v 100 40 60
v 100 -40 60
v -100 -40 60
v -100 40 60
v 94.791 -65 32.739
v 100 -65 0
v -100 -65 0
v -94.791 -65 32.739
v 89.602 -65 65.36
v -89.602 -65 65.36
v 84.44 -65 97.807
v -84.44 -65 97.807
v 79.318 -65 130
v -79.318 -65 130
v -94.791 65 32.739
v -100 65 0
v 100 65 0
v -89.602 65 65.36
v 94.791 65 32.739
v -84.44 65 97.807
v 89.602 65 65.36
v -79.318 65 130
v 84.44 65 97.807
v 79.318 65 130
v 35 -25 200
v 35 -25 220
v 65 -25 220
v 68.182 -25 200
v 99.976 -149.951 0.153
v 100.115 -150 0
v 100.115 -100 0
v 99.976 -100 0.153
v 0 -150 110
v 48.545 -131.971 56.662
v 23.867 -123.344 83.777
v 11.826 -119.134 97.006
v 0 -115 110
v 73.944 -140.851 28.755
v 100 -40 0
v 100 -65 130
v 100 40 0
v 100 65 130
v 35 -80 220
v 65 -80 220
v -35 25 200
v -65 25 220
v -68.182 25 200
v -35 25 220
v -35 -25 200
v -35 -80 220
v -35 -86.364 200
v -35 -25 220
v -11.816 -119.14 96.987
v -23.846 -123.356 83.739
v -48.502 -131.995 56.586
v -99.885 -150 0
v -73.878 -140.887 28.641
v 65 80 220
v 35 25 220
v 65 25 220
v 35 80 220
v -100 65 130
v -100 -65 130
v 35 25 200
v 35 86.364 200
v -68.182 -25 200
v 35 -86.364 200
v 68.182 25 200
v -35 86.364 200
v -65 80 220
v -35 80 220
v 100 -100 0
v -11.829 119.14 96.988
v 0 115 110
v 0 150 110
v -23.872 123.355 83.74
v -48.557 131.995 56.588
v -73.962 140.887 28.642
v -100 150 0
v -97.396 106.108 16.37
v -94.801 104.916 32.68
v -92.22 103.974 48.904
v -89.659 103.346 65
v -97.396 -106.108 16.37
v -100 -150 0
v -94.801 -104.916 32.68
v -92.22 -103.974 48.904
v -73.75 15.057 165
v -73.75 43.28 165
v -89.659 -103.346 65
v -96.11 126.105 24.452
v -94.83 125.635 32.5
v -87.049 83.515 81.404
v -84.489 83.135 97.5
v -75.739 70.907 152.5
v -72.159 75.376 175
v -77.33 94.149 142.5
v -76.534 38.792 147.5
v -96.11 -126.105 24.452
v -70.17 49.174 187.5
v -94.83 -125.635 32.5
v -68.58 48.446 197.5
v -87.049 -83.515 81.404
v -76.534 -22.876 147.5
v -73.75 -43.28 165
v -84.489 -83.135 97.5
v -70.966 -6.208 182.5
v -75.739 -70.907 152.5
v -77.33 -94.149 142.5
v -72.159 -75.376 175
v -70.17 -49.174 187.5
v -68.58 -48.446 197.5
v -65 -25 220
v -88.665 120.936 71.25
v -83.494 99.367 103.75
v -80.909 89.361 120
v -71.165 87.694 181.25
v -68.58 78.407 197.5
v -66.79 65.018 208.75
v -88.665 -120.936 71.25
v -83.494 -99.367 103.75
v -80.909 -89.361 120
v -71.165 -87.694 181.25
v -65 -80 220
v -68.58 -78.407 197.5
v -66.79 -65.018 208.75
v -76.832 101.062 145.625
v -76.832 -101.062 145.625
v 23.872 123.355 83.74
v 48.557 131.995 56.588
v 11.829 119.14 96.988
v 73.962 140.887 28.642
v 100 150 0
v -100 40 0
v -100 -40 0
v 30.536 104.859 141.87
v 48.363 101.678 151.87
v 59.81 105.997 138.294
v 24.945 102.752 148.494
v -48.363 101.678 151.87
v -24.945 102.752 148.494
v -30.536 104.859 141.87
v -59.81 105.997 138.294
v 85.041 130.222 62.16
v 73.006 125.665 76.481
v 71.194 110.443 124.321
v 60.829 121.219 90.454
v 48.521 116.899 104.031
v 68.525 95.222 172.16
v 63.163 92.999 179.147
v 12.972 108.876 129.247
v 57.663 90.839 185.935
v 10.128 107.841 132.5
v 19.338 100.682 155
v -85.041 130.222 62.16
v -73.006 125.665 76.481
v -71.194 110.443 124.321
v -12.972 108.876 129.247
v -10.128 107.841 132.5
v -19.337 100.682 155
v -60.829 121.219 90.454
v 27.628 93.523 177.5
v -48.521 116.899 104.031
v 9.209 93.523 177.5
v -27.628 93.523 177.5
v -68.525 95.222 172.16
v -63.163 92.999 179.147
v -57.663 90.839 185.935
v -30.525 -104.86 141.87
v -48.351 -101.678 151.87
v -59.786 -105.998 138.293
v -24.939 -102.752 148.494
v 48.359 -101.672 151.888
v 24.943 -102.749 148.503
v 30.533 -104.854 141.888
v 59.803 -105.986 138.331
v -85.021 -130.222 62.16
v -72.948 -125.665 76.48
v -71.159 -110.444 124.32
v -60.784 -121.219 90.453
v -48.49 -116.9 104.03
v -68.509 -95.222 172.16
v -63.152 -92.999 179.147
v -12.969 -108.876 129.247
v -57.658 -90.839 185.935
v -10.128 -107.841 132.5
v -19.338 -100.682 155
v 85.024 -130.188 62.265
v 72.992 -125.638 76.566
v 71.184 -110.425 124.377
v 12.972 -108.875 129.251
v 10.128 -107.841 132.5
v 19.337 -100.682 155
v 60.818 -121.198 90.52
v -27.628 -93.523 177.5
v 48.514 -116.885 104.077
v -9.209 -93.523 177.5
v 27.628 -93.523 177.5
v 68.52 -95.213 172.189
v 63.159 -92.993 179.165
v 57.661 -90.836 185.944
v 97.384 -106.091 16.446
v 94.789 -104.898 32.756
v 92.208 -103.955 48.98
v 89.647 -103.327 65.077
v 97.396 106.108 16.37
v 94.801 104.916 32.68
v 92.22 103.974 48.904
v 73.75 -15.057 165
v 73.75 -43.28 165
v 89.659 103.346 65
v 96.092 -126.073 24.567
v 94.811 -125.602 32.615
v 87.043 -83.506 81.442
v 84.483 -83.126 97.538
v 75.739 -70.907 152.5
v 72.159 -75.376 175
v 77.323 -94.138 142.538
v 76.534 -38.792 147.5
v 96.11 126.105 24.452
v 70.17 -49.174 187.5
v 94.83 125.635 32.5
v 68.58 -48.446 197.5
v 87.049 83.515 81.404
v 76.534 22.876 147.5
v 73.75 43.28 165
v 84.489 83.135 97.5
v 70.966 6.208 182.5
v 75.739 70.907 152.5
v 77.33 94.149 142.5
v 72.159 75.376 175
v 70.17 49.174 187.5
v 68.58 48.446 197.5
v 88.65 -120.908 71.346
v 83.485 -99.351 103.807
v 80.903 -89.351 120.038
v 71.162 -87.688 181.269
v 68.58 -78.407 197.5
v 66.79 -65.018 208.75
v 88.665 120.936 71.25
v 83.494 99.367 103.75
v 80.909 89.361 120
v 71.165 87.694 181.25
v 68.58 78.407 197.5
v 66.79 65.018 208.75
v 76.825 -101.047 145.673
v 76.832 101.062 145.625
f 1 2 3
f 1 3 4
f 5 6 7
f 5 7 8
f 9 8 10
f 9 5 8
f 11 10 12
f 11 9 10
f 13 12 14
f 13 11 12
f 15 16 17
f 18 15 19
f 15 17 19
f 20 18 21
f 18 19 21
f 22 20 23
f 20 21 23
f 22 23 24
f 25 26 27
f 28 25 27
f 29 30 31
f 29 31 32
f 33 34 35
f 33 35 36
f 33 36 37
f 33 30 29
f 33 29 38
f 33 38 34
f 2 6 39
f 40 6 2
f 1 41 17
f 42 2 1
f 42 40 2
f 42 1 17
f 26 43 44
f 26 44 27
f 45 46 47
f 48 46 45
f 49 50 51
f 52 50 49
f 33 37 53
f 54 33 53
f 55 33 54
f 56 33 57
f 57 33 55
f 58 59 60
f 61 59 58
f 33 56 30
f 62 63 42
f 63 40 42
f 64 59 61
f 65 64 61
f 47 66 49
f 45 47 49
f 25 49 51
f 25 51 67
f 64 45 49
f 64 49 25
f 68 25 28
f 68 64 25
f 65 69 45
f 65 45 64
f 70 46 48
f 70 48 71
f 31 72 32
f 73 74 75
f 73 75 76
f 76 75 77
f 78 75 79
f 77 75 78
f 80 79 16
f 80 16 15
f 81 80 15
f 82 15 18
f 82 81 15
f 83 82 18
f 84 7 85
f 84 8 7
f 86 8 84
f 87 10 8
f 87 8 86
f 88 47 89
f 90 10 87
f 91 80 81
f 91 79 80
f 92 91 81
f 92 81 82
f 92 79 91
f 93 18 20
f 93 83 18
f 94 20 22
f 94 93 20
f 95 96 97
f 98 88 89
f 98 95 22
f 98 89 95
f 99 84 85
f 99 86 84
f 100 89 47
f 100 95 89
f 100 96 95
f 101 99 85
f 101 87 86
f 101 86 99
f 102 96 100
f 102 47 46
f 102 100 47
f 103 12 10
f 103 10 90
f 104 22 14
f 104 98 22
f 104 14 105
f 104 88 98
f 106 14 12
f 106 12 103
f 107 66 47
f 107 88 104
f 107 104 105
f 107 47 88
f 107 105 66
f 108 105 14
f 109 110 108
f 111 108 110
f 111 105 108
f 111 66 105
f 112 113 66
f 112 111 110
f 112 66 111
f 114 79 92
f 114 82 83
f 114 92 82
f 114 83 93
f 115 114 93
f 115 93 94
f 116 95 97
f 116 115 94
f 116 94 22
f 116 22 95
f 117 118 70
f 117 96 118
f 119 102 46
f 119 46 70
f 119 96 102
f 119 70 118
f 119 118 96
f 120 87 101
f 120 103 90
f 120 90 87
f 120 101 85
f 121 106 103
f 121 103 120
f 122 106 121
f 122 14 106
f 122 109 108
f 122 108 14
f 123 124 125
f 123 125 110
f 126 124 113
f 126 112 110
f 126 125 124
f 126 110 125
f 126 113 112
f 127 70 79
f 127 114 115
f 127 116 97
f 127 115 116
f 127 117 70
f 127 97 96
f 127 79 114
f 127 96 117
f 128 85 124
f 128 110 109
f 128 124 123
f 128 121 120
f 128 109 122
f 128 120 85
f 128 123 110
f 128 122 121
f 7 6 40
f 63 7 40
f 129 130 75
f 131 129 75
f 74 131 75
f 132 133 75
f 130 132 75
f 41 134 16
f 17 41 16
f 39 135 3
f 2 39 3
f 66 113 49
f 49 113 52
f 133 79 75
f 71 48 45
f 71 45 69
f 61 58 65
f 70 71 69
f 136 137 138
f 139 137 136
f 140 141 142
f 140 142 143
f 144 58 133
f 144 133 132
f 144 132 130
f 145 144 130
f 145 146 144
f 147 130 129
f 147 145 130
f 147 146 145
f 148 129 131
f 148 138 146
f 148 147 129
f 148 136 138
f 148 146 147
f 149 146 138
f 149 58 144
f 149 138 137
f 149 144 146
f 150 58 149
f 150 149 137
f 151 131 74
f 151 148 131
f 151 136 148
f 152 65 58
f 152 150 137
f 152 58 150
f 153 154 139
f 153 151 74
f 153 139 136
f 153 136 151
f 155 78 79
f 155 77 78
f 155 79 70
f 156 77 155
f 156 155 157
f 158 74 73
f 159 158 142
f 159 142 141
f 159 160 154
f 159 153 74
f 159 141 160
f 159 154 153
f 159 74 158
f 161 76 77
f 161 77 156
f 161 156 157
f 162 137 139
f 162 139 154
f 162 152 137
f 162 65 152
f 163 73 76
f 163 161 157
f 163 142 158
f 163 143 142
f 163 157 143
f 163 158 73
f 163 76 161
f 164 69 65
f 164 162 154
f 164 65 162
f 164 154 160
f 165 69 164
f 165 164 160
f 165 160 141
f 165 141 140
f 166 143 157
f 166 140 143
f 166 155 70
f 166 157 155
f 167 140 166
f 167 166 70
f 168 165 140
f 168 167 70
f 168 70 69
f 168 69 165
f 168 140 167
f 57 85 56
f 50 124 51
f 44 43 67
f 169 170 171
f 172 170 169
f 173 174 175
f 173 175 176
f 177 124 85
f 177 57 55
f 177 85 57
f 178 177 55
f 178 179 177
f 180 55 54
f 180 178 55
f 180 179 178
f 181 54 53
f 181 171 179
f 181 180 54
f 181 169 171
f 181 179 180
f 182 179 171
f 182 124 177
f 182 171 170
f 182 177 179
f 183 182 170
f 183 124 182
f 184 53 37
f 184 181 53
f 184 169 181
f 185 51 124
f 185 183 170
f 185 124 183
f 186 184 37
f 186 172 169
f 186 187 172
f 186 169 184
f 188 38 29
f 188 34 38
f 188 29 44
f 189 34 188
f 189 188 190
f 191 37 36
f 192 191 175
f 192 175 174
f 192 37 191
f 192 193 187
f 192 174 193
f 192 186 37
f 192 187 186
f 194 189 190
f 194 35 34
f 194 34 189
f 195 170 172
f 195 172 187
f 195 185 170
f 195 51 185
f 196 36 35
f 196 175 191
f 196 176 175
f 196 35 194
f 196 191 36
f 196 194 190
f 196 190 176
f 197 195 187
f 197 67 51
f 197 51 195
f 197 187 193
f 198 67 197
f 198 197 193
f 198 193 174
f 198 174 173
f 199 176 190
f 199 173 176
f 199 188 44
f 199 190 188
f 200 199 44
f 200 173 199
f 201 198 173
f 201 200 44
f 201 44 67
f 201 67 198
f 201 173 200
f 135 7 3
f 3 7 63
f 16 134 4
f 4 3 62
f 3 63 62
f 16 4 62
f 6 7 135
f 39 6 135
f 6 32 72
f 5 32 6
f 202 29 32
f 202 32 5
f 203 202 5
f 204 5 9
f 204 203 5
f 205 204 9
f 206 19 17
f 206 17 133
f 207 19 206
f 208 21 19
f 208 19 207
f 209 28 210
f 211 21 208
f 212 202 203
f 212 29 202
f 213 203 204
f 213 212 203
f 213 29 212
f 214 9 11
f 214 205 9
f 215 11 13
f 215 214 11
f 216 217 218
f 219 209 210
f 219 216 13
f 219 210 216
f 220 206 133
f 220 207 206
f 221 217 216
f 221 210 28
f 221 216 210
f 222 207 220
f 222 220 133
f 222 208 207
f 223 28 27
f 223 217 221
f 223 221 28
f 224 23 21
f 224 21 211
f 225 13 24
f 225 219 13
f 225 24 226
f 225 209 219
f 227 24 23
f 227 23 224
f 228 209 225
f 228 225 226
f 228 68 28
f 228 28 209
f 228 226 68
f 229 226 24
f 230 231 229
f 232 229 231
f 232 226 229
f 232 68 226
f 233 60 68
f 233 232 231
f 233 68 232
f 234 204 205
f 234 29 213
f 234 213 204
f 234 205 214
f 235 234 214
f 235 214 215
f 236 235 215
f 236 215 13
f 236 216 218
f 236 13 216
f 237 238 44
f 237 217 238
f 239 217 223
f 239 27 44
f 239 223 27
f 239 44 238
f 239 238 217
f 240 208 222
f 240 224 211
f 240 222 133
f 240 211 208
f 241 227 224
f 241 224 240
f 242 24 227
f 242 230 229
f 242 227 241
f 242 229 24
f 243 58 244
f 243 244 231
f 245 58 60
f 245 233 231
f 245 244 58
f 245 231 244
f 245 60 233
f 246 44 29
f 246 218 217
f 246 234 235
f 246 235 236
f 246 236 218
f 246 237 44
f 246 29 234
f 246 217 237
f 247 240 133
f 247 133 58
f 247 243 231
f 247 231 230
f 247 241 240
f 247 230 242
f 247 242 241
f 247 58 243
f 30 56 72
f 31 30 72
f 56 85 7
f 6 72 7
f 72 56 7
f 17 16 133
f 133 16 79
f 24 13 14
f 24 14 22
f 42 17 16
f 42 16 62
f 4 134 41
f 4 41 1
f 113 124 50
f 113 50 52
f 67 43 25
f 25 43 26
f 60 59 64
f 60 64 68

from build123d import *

# Parameters (mm, degrees)
SKETCH006_W     = 130
SKETCH006_H     = 130
PAD002_DEPTH    = 100
PAD001_DEPTH    = 50
PAD_DEPTH       = 50
SKETCH_W        = 200
SKETCH_H        = 300
SKETCH001_W     = 130
SKETCH001_H     = 160
SKETCH002_W     = 70
SKETCH002_H     = 243.677445
POCKET_DEPTH    = 20
SKETCH003_W     = 239.164902
SKETCH003_H     = 50
POCKET001_DEPTH = 20
SKETCH007_W     = 130
SKETCH007_H     = 130
PAD003_DEPTH    = 100
SKETCH008_W     = 80
SKETCH008_H     = 60
POCKET002_DEPTH = 200.001


with BuildPart() as pad002:
    # Sketch006 → Pad002 (new body, symmetric)
    with BuildSketch(Plane.YZ):
        with Locations((0, 65)):
            Rectangle(SKETCH006_W, SKETCH006_H)
    extrude(amount=PAD002_DEPTH, both=True)


with BuildPart() as pad001:
    # Sketch005 → Pad001 (new body)
    with BuildSketch(Plane.XZ.offset(-150)):
        Polygon((-100, 0), (100, 0), (0, 110), align=None)
    extrude(amount=PAD001_DEPTH)


with BuildPart() as pad:
    # Sketch004 → Pad (new body)
    with BuildSketch(Plane.XZ.offset(150)):
        Polygon((-99.885067, 0), (100.114933, 0), (0, 110), align=None)
    extrude(amount=-PAD_DEPTH)


with BuildPart() as cut:
    # Sketch → Loft section 0
    with BuildSketch(Plane.XY):
        Rectangle(SKETCH_W, SKETCH_H)
    # Sketch001 → Loft section 1
    with BuildSketch(Plane.XY.offset(220)):
        Rectangle(SKETCH001_W, SKETCH001_H)
    loft()

    # Sketch002 → Pocket (cut)
    with BuildSketch(Plane.XY.offset(220)):
        with Locations((0, 5.415055)):
            Rectangle(SKETCH002_W, SKETCH002_H)
    extrude(amount=-POCKET_DEPTH, mode=Mode.SUBTRACT)

    # Sketch003 → Pocket001 (cut)
    with BuildSketch(Plane.XY.offset(220)):
        with Locations((8.122597, 0)):
            Rectangle(SKETCH003_W, SKETCH003_H)
    extrude(amount=-POCKET001_DEPTH, mode=Mode.SUBTRACT)

    # Fusion: union Pad
    add(pad.part)

    # Fusion001: union Pad001
    add(pad001.part)

    # Cut: cut Pad002
    add(pad002.part, mode=Mode.SUBTRACT)


with BuildPart() as pocket002:
    # Sketch007 → Pad003 (new body, symmetric)
    with BuildSketch(Plane.YZ):
        with Locations((0, 65)):
            Rectangle(SKETCH007_W, SKETCH007_H)
    extrude(amount=PAD003_DEPTH, both=True)

    # Sketch008 → Pocket002 (cut, through all)
    with BuildSketch(Plane.YZ.offset(100)):
        with Locations((0, 30)):
            Rectangle(SKETCH008_W, SKETCH008_H)
    extrude(amount=-POCKET002_DEPTH, mode=Mode.SUBTRACT)


solid = Compound([cut.part, pocket002.part])
